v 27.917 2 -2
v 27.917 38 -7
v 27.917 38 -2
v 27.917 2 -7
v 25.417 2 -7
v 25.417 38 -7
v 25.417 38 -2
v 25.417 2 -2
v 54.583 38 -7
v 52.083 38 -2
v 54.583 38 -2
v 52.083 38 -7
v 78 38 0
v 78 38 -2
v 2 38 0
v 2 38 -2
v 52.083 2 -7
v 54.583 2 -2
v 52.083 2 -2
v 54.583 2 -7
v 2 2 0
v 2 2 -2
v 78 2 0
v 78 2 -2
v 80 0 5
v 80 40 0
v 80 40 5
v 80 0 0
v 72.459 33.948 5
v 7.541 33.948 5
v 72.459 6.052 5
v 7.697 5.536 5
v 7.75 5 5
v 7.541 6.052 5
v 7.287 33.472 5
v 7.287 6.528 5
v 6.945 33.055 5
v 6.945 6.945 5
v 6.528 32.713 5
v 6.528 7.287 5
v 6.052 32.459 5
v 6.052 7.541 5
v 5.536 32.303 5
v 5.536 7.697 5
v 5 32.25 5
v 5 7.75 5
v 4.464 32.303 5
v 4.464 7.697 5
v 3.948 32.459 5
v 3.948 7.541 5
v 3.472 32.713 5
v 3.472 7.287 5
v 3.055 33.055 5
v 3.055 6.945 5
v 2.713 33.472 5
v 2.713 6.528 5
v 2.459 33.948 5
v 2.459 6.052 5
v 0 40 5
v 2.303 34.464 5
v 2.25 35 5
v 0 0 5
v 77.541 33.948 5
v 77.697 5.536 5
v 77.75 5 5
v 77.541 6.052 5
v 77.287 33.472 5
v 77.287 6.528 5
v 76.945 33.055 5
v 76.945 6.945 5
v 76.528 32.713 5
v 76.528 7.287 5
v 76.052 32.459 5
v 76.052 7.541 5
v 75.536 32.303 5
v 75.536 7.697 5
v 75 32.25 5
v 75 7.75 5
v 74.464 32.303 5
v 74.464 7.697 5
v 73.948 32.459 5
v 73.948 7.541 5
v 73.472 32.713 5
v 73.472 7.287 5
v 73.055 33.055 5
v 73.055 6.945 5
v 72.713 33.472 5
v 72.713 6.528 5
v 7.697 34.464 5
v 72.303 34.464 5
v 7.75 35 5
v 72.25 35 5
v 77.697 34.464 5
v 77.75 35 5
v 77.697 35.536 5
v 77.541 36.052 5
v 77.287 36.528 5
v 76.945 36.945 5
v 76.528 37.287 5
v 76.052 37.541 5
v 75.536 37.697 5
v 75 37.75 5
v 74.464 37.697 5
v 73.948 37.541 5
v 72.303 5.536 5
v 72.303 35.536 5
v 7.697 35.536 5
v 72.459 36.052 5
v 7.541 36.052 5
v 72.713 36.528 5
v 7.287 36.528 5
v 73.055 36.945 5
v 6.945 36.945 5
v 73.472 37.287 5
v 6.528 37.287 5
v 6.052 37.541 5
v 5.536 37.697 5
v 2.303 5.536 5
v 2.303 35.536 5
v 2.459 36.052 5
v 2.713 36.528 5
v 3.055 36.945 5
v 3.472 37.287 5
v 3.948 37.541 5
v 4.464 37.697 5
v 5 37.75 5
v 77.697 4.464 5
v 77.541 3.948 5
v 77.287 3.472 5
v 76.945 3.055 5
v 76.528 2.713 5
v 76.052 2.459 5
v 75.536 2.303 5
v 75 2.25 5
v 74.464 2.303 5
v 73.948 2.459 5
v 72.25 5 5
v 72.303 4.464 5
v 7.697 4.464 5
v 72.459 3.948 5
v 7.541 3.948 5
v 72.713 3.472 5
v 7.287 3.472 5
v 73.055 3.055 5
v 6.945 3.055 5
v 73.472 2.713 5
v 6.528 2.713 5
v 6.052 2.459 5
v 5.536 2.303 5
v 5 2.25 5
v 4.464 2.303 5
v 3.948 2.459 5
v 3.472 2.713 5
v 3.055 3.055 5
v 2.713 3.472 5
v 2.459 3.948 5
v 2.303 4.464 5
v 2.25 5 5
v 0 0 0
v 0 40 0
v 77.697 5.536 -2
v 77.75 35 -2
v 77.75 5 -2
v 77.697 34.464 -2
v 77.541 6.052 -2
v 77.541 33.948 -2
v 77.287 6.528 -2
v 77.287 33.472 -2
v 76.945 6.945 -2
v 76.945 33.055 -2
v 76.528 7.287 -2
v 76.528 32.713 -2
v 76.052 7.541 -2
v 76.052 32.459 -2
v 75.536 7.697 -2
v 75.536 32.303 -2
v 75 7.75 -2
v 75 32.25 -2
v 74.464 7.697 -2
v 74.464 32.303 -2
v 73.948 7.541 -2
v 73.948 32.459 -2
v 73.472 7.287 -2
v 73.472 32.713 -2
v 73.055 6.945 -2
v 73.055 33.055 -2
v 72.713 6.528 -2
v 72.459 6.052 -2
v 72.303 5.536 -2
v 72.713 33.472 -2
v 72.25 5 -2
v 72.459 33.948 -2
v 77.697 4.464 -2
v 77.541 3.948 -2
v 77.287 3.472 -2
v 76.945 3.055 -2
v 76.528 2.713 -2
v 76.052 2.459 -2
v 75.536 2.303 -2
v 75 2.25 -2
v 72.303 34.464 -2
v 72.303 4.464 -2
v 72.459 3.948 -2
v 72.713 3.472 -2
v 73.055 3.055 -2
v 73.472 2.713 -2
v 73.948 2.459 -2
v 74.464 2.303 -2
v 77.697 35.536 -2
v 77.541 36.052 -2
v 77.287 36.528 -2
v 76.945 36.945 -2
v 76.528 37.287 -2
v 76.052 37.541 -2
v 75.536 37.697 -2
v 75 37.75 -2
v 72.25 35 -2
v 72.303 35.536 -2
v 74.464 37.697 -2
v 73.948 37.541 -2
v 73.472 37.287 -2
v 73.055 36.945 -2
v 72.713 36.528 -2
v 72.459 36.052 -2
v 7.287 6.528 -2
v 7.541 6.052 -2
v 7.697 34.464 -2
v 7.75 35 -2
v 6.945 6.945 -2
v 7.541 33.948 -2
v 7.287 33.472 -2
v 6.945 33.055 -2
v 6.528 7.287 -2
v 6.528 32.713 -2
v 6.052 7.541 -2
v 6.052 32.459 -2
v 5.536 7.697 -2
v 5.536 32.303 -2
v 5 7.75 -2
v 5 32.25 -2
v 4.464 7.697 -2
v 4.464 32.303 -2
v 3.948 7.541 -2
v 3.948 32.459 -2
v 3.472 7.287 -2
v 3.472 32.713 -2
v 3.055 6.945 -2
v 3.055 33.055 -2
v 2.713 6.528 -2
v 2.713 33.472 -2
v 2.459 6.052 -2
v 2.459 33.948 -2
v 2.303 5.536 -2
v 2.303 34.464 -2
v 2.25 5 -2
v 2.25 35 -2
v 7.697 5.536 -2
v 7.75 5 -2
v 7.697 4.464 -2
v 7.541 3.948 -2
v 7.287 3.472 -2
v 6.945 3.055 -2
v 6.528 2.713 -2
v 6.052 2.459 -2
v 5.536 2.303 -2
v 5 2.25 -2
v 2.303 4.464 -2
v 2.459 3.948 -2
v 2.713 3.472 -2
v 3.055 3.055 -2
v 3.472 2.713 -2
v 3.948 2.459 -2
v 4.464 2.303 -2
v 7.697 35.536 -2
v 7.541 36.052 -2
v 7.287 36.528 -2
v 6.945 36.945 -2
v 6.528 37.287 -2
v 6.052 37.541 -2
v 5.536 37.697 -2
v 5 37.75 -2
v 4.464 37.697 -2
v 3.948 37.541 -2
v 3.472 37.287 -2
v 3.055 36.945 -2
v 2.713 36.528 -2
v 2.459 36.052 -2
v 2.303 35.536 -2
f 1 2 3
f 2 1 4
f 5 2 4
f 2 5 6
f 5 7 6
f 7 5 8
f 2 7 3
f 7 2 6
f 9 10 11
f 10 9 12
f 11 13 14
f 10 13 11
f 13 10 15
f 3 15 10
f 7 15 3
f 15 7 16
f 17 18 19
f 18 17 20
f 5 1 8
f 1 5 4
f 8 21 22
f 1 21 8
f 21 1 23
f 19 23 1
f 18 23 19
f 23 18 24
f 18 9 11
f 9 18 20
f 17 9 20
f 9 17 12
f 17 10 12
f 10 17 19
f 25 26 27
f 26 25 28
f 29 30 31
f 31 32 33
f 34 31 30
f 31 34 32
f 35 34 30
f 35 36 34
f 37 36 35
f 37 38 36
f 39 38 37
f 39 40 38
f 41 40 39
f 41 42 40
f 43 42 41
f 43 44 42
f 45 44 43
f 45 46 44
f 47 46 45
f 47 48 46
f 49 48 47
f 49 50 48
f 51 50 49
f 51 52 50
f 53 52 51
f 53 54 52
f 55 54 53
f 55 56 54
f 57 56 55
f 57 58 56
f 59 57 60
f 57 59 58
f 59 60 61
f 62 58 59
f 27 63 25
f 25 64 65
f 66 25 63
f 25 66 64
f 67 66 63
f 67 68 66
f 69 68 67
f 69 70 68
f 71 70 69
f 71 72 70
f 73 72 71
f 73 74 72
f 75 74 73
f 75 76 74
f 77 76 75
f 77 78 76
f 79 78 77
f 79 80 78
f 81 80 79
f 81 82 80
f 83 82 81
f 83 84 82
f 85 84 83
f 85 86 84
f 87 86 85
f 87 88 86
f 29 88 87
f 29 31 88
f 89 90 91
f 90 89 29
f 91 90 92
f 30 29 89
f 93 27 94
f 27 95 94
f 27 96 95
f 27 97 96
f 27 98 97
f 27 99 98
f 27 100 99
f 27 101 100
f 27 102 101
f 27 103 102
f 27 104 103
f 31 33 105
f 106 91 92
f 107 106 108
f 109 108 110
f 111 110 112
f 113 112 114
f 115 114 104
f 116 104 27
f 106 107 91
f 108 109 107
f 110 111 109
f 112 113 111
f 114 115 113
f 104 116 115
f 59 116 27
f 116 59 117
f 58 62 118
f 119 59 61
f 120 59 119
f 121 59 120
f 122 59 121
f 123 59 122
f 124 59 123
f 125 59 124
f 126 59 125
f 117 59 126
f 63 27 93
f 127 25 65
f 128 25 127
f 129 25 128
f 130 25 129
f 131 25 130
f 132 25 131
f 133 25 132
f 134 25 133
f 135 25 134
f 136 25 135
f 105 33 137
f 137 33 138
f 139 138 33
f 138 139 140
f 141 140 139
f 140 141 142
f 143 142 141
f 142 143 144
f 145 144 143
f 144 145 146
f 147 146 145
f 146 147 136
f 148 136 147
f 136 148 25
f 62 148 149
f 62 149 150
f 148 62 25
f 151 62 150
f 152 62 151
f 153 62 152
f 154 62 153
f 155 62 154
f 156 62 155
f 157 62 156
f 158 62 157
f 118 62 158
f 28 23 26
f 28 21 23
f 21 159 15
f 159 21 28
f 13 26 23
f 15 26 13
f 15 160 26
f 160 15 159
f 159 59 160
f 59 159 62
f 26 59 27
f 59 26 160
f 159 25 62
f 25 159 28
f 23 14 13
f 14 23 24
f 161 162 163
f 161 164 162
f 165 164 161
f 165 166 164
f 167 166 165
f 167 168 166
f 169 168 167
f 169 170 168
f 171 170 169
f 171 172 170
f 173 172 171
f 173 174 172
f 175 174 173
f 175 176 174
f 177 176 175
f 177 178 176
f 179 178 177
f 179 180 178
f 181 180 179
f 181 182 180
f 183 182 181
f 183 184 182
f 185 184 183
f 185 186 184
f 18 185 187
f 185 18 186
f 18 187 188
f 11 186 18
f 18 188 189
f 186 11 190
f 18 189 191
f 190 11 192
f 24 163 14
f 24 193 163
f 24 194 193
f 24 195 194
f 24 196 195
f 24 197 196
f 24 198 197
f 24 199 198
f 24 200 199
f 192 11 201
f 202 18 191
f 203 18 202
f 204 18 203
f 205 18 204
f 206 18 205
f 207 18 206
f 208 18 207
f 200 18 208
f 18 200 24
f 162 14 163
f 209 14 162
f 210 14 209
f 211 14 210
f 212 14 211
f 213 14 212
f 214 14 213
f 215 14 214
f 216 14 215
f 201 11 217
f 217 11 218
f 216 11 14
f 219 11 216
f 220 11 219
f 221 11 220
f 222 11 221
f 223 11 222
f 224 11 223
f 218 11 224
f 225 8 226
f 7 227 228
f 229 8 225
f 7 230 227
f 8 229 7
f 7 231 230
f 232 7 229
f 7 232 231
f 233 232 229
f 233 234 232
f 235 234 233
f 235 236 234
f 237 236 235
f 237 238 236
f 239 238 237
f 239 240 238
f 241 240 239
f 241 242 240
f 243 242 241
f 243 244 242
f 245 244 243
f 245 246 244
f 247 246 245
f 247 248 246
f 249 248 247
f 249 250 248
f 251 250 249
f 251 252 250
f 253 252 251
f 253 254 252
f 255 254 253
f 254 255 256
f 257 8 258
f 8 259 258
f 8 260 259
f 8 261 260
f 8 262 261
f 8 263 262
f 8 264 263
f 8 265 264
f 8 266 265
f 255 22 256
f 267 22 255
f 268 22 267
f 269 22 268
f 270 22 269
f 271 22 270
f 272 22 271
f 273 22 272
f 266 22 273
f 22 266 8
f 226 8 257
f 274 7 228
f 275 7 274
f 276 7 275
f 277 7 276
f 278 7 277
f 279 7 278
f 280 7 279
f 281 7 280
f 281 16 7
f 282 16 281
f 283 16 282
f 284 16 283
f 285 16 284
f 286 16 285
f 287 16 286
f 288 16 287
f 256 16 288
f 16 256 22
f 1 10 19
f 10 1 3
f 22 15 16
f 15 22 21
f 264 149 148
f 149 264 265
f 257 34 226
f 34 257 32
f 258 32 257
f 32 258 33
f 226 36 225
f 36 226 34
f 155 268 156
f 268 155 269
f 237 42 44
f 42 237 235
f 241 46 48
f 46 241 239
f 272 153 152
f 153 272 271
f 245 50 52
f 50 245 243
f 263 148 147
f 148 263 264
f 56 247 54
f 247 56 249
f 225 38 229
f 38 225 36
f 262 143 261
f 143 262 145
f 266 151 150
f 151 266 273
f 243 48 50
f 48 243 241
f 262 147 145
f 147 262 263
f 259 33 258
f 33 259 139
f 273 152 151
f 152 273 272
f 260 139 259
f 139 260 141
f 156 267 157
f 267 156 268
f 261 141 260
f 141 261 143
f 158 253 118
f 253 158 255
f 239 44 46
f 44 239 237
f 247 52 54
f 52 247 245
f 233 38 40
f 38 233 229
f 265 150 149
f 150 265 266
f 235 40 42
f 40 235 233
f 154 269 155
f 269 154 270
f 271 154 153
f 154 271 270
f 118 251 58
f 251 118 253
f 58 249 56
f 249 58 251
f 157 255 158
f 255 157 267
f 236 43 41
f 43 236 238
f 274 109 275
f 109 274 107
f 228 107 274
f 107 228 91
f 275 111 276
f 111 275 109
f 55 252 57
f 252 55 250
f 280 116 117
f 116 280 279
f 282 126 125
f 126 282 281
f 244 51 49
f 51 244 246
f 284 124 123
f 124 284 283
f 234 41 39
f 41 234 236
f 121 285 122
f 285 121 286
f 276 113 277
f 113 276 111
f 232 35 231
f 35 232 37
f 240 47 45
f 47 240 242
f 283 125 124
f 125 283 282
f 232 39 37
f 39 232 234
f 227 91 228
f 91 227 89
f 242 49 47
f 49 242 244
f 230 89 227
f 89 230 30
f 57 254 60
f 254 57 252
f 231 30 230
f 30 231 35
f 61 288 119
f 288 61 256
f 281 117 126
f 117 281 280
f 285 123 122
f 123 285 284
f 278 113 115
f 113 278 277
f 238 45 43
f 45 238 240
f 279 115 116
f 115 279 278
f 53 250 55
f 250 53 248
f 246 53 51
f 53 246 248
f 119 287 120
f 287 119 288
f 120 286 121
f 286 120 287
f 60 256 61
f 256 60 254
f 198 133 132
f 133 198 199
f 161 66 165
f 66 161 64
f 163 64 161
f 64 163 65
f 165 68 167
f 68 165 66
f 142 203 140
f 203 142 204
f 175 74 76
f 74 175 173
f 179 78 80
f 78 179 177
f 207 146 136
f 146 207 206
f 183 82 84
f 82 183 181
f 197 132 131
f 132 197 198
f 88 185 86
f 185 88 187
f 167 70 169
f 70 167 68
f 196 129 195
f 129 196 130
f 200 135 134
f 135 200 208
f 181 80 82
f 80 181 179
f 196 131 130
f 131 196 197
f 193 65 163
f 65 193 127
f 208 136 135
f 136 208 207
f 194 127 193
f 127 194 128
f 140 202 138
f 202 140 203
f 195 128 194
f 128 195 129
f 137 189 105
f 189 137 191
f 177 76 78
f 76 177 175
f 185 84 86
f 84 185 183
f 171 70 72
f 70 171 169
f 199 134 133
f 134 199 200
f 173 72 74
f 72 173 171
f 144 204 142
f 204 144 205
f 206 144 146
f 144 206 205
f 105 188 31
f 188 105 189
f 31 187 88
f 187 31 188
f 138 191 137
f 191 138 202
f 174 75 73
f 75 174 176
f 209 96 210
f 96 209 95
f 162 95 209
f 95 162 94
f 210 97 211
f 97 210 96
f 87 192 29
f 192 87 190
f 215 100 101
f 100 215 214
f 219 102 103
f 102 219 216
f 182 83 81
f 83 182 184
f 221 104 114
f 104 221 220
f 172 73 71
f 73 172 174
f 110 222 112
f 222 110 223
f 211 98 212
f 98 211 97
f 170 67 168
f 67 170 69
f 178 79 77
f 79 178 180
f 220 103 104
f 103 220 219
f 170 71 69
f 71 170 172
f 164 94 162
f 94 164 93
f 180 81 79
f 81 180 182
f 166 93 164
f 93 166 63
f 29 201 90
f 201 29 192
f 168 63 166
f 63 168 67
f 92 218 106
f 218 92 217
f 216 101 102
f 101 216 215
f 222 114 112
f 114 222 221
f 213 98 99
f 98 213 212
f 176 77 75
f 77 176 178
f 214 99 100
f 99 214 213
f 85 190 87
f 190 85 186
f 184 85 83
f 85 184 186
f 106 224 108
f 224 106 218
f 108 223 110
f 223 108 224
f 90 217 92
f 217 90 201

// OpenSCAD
$fn = 32;

// ----------------------------------------------------------------------
// Enclosure lid: 80 x 40 x 5 mm, 4 bolt holes
// ----------------------------------------------------------------------

// --- parameters (mm) ---
length = 80;              // lid length, X
width = 40;               // lid width, Y
plate_t = 5;              // lid plate thickness
bolt_d = 5.5;             // bolt clearance
boss_lip = 5;             // bolt hole inset from the corner
sink = 1;                 // overlap of the lip and ribs into the plate
lip_h = 3;                // lip height below the plate
lip_wall = 2;             // lip wall thickness
rib_n = 2;                // stiffening ribs
rib_t = 2.5;              // rib thickness
rib_h = 8;                // rib height below the plate

module plate() {
  cube([length, width, plate_t]);
  /* lip that drops into the housing opening, sunk into the plate */
  translate([lip_wall, lip_wall, -lip_h + sink]) cube([length - 2 * lip_wall, width - 2 * lip_wall, lip_h]);
  /* stiffening ribs under the plate */
  for (i = [1 : rib_n]) translate([length * i / (rib_n + 1) - rib_t / 2, lip_wall, -rib_h + sink]) cube([rib_t, width - 2 * lip_wall, rib_h]);
}

difference() {
  plate();
  /* bolt pattern matching the corner bosses */
  for (sx = [0, 1]) for (sy = [0, 1])
    translate([sx * (length - 2 * boss_lip) + boss_lip, sy * (width - 2 * boss_lip) + boss_lip, -lip_h - 1])
      cylinder(h = plate_t + lip_h + 2, d = bolt_d);
}
